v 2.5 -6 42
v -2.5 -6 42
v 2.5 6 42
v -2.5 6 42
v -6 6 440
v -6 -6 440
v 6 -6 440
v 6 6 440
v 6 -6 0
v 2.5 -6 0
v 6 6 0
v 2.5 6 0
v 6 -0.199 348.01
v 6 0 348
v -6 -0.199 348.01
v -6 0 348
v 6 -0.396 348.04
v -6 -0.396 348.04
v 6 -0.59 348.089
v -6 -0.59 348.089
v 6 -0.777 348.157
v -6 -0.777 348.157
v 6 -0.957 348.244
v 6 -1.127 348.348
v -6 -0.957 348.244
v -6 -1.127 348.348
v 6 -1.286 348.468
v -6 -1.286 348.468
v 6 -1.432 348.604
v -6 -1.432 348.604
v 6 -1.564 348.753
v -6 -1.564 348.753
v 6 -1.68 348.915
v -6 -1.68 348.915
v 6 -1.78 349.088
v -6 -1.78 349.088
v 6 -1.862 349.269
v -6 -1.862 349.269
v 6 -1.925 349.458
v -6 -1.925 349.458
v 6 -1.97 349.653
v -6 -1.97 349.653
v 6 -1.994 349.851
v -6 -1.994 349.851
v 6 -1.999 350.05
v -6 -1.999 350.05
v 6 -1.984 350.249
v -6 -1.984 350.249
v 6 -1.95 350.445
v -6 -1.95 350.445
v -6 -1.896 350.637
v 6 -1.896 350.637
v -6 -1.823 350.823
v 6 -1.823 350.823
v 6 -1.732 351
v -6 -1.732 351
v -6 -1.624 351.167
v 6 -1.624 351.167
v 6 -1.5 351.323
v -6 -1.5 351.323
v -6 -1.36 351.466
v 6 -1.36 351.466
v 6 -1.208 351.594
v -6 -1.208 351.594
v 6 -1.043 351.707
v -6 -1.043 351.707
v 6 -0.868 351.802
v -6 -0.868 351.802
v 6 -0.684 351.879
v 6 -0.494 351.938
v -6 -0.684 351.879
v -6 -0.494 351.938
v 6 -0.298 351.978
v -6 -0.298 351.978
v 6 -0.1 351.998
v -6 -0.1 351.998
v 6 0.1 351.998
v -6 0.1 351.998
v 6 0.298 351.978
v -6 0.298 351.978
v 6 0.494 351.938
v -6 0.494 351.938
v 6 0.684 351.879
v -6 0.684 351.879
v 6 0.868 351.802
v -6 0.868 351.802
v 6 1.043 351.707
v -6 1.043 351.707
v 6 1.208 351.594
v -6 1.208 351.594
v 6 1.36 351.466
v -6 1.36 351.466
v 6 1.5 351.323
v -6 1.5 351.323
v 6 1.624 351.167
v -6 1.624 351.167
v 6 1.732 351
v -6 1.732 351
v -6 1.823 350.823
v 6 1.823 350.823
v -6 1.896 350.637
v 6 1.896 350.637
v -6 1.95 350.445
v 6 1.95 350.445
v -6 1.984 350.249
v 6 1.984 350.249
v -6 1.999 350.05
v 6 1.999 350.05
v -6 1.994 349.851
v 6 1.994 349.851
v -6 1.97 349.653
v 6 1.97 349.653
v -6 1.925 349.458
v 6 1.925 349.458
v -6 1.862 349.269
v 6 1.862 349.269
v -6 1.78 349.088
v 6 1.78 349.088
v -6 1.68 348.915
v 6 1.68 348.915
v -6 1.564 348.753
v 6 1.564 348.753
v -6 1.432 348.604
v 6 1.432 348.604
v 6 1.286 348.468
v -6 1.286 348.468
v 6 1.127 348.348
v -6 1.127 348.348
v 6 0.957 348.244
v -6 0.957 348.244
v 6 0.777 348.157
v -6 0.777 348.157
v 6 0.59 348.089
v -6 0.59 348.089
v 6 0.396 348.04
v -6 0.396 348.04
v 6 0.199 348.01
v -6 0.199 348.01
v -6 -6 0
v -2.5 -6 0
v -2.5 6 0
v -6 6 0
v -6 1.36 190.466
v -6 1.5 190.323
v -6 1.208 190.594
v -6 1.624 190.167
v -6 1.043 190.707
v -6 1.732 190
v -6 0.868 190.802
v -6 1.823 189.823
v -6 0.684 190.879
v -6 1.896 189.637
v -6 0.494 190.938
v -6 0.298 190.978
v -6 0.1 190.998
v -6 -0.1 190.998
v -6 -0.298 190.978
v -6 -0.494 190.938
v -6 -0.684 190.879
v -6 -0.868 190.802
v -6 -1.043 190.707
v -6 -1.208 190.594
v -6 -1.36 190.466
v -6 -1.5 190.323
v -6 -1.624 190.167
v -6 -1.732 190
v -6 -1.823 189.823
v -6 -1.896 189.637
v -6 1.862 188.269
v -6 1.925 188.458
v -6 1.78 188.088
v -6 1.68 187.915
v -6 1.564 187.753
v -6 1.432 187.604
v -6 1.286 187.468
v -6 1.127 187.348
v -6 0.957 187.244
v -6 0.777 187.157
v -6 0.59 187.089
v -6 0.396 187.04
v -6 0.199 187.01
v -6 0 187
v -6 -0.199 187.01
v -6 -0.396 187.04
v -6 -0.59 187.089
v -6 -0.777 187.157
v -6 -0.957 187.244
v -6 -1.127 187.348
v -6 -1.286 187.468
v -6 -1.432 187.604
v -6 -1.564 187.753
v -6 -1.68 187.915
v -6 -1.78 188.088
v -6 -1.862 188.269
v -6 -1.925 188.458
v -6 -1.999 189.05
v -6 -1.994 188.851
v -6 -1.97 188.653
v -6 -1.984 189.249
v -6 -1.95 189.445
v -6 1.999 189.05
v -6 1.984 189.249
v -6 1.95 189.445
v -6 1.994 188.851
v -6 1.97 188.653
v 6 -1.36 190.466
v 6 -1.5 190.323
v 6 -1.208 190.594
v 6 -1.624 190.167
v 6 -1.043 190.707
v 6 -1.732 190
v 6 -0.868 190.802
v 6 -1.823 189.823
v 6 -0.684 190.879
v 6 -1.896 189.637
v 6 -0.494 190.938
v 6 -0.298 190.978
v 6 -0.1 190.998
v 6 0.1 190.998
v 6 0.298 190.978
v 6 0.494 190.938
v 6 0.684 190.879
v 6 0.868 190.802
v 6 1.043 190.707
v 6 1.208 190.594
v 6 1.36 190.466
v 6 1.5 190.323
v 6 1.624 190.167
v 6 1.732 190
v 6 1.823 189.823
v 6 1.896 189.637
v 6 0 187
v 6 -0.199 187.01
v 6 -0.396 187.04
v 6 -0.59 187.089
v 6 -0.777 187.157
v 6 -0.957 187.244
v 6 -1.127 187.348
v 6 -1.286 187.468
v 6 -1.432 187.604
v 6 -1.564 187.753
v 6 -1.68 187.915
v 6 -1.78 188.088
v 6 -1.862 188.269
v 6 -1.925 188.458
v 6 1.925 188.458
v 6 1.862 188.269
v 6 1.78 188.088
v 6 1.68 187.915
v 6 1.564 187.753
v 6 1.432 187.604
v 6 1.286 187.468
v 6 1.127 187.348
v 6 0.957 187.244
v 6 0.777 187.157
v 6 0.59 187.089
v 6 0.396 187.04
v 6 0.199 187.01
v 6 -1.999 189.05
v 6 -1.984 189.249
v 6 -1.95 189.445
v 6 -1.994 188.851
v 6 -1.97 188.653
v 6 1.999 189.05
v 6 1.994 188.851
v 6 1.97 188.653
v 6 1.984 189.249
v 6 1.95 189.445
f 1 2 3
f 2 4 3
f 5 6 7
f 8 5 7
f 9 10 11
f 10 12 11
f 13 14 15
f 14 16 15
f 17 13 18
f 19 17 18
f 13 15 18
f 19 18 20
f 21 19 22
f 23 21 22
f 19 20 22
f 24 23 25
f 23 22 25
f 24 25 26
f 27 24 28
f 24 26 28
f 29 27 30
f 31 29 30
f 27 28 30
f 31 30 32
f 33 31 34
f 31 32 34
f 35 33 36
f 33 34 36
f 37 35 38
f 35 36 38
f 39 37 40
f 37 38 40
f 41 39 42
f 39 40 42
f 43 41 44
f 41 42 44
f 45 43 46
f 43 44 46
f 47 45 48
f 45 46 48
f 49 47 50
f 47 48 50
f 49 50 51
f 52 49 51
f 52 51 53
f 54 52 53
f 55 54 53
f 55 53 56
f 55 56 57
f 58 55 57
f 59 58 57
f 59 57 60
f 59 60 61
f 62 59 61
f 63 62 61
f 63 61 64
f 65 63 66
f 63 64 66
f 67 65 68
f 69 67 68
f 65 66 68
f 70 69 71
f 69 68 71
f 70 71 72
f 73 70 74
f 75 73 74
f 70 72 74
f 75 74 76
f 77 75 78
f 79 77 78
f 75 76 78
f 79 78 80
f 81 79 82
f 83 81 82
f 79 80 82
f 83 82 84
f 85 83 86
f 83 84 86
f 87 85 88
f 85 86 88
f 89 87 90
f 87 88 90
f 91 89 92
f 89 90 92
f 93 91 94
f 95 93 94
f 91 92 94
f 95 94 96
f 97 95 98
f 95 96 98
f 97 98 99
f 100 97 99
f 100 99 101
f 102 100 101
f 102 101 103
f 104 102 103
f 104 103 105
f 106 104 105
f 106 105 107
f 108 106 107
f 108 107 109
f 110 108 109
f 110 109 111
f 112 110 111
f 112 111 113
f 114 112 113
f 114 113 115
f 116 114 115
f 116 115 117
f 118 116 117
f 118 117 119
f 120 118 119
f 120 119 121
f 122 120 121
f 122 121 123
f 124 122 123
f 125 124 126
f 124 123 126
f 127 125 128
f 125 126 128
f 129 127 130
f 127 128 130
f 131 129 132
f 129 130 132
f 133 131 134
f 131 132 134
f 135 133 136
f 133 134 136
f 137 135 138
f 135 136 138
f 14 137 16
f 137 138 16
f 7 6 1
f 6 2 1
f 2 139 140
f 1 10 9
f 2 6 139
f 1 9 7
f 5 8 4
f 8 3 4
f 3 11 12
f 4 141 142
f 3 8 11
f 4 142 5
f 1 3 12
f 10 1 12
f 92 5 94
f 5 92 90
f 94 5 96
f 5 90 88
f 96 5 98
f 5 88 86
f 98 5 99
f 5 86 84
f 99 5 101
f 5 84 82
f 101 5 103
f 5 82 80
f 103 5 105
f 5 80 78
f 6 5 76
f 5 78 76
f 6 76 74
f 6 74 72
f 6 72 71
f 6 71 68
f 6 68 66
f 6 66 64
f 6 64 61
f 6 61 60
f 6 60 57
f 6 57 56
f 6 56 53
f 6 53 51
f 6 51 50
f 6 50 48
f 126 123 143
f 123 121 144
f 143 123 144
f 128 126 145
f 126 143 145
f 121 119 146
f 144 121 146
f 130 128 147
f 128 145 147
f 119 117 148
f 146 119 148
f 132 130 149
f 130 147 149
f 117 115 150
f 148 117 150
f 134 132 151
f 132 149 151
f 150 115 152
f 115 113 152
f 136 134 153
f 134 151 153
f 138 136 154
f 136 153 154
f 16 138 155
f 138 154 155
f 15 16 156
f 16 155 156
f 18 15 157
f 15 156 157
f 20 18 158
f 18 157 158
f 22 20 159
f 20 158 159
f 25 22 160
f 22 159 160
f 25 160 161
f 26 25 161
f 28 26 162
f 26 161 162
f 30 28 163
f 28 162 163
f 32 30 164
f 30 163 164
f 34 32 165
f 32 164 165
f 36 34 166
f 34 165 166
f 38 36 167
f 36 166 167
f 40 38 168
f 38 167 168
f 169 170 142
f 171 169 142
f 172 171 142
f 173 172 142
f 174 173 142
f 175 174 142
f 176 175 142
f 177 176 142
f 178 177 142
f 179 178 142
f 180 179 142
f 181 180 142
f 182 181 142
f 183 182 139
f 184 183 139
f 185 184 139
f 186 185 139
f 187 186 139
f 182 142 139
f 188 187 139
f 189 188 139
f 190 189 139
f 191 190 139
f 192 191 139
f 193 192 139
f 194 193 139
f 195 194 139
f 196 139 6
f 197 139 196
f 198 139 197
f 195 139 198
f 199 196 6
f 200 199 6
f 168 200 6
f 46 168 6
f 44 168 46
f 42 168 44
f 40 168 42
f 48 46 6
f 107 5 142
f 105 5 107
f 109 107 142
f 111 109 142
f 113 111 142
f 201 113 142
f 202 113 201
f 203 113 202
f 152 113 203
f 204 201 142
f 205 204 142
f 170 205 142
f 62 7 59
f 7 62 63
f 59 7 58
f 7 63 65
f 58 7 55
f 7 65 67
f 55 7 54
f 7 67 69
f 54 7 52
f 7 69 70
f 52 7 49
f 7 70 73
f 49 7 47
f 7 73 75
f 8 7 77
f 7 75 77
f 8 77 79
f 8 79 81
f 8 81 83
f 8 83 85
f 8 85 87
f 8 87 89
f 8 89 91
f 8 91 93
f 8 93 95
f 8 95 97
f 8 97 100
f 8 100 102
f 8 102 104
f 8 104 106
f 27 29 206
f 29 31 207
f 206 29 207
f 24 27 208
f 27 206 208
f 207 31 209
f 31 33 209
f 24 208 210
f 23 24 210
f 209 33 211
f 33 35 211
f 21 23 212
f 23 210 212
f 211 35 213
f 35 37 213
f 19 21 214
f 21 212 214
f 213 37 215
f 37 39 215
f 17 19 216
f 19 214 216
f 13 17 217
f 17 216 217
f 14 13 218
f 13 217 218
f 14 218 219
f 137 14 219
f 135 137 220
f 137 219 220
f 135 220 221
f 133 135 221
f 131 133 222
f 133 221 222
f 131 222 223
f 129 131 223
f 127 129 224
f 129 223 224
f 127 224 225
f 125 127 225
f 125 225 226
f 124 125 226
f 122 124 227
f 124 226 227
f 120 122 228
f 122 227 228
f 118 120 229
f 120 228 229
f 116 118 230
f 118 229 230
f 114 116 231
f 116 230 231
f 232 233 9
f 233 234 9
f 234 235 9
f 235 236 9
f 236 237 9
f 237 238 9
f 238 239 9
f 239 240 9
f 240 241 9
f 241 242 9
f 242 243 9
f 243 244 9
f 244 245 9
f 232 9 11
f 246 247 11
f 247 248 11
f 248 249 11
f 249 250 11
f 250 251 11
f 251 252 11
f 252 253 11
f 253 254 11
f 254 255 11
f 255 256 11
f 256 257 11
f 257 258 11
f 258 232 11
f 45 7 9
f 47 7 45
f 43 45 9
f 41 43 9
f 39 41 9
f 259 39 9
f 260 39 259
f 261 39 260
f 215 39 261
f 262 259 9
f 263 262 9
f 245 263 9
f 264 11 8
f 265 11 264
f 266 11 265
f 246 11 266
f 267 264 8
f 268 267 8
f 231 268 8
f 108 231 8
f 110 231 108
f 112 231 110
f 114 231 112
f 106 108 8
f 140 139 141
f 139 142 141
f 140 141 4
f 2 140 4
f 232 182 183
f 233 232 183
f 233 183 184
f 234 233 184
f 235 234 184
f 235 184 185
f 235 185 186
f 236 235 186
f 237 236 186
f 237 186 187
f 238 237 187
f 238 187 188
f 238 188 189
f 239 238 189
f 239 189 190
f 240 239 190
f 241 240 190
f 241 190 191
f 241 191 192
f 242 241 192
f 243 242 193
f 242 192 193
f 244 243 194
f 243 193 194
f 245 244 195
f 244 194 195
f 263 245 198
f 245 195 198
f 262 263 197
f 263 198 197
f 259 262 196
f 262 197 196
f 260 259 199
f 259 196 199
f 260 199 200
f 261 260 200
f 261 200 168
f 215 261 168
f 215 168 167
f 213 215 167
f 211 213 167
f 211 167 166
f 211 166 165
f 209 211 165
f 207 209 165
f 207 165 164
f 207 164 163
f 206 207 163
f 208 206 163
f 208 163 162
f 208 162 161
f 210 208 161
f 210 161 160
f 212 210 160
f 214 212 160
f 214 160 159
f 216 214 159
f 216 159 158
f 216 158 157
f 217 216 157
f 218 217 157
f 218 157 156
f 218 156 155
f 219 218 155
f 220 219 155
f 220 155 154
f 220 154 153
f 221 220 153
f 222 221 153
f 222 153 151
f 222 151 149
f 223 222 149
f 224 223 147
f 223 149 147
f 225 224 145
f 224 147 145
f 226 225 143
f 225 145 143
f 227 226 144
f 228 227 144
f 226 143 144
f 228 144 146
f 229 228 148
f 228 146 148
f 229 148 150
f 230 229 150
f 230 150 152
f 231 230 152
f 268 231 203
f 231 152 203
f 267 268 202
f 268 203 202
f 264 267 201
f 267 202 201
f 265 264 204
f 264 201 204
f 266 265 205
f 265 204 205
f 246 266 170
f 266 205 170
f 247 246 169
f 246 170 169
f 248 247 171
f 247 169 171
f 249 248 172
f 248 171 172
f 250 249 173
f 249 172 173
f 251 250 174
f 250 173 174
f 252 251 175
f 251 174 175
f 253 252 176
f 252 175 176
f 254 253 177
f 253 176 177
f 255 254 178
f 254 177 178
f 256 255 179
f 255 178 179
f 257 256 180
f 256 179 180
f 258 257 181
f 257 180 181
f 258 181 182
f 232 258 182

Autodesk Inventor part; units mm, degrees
ref_plane "YZ Plane" through (0, 0, 0) normal (1, 0, 0) x (0, 1, 0)
ref_plane "XZ Plane" through (0, 0, 0) normal (0, 1, 0) x (-1, 0, 0)
ref_plane "XY Plane" through (0, 0, 0) normal (0, 0, 1) x (1, 0, 0)
sketch "Sketch1" plane through (0, 0, 0) normal (0, 0, 1) x (1, 0, 0)
  line L0 (-6, -6) -> (6, -6)
  line L1 (6, -6) -> (6, 6)
  line L2 (6, 6) -> (-6, 6)
  line L3 (-6, 6) -> (-6, -6)
  line L4 (-6, -6) -> (6, 6) construction
  line L5 (6, -6) -> (-6, 6) construction
  point P0 (0, 0)
  dimension "d0" = 12
  dimension "d1" = 12
extrude "Extrusion1" add sketch "Sketch1" along normal blind 440
sketch "Sketch4" plane through (-6, 6, 0) normal (0, 1, 0) x (1, 0, 0)
  line L0 (12, 0) -> (0, 0) projected
  line L1 (0, 0) -> (0, -440) projected
  line L2 (12, -440) -> (0, -440) projected
  line L3 (12, 0) -> (12, -440) projected
  line L4 (3.5, 0) -> (3.5, -42)
  line L5 (3.5, -42) -> (8.5, -42)
  line L6 (8.5, -42) -> (8.5, 0)
  point P0 (6, 0)
  point P1 (6, -42)
  point P2 (6, 0)
  dimension "d17" = 5
  dimension "d18" = 42
extrude "Extrusion3" cut sketch "Sketch4" against normal through all contours L6 L5 L4 L0
sketch "Sketch5" plane through (6, -6, 0) normal (1, 0, 0) x (0, 0, -1)
  line L0 (-440, 0) -> (-440, 12) projected
  point P0 (0, 6)
  point P1 (-350, 6)
  point P2 (-189, 6)
  point P3 (-440, 6)
  dimension "d21" = 161
  dimension "d24" = 90
hole "Hole2" at (6, 0, 350) at (6, 0, 189) direction (-1, 0, 0) diameter 4 end through all
equation "\"d0\" = d1"
properties part number "tailboom" material "Balsa"
